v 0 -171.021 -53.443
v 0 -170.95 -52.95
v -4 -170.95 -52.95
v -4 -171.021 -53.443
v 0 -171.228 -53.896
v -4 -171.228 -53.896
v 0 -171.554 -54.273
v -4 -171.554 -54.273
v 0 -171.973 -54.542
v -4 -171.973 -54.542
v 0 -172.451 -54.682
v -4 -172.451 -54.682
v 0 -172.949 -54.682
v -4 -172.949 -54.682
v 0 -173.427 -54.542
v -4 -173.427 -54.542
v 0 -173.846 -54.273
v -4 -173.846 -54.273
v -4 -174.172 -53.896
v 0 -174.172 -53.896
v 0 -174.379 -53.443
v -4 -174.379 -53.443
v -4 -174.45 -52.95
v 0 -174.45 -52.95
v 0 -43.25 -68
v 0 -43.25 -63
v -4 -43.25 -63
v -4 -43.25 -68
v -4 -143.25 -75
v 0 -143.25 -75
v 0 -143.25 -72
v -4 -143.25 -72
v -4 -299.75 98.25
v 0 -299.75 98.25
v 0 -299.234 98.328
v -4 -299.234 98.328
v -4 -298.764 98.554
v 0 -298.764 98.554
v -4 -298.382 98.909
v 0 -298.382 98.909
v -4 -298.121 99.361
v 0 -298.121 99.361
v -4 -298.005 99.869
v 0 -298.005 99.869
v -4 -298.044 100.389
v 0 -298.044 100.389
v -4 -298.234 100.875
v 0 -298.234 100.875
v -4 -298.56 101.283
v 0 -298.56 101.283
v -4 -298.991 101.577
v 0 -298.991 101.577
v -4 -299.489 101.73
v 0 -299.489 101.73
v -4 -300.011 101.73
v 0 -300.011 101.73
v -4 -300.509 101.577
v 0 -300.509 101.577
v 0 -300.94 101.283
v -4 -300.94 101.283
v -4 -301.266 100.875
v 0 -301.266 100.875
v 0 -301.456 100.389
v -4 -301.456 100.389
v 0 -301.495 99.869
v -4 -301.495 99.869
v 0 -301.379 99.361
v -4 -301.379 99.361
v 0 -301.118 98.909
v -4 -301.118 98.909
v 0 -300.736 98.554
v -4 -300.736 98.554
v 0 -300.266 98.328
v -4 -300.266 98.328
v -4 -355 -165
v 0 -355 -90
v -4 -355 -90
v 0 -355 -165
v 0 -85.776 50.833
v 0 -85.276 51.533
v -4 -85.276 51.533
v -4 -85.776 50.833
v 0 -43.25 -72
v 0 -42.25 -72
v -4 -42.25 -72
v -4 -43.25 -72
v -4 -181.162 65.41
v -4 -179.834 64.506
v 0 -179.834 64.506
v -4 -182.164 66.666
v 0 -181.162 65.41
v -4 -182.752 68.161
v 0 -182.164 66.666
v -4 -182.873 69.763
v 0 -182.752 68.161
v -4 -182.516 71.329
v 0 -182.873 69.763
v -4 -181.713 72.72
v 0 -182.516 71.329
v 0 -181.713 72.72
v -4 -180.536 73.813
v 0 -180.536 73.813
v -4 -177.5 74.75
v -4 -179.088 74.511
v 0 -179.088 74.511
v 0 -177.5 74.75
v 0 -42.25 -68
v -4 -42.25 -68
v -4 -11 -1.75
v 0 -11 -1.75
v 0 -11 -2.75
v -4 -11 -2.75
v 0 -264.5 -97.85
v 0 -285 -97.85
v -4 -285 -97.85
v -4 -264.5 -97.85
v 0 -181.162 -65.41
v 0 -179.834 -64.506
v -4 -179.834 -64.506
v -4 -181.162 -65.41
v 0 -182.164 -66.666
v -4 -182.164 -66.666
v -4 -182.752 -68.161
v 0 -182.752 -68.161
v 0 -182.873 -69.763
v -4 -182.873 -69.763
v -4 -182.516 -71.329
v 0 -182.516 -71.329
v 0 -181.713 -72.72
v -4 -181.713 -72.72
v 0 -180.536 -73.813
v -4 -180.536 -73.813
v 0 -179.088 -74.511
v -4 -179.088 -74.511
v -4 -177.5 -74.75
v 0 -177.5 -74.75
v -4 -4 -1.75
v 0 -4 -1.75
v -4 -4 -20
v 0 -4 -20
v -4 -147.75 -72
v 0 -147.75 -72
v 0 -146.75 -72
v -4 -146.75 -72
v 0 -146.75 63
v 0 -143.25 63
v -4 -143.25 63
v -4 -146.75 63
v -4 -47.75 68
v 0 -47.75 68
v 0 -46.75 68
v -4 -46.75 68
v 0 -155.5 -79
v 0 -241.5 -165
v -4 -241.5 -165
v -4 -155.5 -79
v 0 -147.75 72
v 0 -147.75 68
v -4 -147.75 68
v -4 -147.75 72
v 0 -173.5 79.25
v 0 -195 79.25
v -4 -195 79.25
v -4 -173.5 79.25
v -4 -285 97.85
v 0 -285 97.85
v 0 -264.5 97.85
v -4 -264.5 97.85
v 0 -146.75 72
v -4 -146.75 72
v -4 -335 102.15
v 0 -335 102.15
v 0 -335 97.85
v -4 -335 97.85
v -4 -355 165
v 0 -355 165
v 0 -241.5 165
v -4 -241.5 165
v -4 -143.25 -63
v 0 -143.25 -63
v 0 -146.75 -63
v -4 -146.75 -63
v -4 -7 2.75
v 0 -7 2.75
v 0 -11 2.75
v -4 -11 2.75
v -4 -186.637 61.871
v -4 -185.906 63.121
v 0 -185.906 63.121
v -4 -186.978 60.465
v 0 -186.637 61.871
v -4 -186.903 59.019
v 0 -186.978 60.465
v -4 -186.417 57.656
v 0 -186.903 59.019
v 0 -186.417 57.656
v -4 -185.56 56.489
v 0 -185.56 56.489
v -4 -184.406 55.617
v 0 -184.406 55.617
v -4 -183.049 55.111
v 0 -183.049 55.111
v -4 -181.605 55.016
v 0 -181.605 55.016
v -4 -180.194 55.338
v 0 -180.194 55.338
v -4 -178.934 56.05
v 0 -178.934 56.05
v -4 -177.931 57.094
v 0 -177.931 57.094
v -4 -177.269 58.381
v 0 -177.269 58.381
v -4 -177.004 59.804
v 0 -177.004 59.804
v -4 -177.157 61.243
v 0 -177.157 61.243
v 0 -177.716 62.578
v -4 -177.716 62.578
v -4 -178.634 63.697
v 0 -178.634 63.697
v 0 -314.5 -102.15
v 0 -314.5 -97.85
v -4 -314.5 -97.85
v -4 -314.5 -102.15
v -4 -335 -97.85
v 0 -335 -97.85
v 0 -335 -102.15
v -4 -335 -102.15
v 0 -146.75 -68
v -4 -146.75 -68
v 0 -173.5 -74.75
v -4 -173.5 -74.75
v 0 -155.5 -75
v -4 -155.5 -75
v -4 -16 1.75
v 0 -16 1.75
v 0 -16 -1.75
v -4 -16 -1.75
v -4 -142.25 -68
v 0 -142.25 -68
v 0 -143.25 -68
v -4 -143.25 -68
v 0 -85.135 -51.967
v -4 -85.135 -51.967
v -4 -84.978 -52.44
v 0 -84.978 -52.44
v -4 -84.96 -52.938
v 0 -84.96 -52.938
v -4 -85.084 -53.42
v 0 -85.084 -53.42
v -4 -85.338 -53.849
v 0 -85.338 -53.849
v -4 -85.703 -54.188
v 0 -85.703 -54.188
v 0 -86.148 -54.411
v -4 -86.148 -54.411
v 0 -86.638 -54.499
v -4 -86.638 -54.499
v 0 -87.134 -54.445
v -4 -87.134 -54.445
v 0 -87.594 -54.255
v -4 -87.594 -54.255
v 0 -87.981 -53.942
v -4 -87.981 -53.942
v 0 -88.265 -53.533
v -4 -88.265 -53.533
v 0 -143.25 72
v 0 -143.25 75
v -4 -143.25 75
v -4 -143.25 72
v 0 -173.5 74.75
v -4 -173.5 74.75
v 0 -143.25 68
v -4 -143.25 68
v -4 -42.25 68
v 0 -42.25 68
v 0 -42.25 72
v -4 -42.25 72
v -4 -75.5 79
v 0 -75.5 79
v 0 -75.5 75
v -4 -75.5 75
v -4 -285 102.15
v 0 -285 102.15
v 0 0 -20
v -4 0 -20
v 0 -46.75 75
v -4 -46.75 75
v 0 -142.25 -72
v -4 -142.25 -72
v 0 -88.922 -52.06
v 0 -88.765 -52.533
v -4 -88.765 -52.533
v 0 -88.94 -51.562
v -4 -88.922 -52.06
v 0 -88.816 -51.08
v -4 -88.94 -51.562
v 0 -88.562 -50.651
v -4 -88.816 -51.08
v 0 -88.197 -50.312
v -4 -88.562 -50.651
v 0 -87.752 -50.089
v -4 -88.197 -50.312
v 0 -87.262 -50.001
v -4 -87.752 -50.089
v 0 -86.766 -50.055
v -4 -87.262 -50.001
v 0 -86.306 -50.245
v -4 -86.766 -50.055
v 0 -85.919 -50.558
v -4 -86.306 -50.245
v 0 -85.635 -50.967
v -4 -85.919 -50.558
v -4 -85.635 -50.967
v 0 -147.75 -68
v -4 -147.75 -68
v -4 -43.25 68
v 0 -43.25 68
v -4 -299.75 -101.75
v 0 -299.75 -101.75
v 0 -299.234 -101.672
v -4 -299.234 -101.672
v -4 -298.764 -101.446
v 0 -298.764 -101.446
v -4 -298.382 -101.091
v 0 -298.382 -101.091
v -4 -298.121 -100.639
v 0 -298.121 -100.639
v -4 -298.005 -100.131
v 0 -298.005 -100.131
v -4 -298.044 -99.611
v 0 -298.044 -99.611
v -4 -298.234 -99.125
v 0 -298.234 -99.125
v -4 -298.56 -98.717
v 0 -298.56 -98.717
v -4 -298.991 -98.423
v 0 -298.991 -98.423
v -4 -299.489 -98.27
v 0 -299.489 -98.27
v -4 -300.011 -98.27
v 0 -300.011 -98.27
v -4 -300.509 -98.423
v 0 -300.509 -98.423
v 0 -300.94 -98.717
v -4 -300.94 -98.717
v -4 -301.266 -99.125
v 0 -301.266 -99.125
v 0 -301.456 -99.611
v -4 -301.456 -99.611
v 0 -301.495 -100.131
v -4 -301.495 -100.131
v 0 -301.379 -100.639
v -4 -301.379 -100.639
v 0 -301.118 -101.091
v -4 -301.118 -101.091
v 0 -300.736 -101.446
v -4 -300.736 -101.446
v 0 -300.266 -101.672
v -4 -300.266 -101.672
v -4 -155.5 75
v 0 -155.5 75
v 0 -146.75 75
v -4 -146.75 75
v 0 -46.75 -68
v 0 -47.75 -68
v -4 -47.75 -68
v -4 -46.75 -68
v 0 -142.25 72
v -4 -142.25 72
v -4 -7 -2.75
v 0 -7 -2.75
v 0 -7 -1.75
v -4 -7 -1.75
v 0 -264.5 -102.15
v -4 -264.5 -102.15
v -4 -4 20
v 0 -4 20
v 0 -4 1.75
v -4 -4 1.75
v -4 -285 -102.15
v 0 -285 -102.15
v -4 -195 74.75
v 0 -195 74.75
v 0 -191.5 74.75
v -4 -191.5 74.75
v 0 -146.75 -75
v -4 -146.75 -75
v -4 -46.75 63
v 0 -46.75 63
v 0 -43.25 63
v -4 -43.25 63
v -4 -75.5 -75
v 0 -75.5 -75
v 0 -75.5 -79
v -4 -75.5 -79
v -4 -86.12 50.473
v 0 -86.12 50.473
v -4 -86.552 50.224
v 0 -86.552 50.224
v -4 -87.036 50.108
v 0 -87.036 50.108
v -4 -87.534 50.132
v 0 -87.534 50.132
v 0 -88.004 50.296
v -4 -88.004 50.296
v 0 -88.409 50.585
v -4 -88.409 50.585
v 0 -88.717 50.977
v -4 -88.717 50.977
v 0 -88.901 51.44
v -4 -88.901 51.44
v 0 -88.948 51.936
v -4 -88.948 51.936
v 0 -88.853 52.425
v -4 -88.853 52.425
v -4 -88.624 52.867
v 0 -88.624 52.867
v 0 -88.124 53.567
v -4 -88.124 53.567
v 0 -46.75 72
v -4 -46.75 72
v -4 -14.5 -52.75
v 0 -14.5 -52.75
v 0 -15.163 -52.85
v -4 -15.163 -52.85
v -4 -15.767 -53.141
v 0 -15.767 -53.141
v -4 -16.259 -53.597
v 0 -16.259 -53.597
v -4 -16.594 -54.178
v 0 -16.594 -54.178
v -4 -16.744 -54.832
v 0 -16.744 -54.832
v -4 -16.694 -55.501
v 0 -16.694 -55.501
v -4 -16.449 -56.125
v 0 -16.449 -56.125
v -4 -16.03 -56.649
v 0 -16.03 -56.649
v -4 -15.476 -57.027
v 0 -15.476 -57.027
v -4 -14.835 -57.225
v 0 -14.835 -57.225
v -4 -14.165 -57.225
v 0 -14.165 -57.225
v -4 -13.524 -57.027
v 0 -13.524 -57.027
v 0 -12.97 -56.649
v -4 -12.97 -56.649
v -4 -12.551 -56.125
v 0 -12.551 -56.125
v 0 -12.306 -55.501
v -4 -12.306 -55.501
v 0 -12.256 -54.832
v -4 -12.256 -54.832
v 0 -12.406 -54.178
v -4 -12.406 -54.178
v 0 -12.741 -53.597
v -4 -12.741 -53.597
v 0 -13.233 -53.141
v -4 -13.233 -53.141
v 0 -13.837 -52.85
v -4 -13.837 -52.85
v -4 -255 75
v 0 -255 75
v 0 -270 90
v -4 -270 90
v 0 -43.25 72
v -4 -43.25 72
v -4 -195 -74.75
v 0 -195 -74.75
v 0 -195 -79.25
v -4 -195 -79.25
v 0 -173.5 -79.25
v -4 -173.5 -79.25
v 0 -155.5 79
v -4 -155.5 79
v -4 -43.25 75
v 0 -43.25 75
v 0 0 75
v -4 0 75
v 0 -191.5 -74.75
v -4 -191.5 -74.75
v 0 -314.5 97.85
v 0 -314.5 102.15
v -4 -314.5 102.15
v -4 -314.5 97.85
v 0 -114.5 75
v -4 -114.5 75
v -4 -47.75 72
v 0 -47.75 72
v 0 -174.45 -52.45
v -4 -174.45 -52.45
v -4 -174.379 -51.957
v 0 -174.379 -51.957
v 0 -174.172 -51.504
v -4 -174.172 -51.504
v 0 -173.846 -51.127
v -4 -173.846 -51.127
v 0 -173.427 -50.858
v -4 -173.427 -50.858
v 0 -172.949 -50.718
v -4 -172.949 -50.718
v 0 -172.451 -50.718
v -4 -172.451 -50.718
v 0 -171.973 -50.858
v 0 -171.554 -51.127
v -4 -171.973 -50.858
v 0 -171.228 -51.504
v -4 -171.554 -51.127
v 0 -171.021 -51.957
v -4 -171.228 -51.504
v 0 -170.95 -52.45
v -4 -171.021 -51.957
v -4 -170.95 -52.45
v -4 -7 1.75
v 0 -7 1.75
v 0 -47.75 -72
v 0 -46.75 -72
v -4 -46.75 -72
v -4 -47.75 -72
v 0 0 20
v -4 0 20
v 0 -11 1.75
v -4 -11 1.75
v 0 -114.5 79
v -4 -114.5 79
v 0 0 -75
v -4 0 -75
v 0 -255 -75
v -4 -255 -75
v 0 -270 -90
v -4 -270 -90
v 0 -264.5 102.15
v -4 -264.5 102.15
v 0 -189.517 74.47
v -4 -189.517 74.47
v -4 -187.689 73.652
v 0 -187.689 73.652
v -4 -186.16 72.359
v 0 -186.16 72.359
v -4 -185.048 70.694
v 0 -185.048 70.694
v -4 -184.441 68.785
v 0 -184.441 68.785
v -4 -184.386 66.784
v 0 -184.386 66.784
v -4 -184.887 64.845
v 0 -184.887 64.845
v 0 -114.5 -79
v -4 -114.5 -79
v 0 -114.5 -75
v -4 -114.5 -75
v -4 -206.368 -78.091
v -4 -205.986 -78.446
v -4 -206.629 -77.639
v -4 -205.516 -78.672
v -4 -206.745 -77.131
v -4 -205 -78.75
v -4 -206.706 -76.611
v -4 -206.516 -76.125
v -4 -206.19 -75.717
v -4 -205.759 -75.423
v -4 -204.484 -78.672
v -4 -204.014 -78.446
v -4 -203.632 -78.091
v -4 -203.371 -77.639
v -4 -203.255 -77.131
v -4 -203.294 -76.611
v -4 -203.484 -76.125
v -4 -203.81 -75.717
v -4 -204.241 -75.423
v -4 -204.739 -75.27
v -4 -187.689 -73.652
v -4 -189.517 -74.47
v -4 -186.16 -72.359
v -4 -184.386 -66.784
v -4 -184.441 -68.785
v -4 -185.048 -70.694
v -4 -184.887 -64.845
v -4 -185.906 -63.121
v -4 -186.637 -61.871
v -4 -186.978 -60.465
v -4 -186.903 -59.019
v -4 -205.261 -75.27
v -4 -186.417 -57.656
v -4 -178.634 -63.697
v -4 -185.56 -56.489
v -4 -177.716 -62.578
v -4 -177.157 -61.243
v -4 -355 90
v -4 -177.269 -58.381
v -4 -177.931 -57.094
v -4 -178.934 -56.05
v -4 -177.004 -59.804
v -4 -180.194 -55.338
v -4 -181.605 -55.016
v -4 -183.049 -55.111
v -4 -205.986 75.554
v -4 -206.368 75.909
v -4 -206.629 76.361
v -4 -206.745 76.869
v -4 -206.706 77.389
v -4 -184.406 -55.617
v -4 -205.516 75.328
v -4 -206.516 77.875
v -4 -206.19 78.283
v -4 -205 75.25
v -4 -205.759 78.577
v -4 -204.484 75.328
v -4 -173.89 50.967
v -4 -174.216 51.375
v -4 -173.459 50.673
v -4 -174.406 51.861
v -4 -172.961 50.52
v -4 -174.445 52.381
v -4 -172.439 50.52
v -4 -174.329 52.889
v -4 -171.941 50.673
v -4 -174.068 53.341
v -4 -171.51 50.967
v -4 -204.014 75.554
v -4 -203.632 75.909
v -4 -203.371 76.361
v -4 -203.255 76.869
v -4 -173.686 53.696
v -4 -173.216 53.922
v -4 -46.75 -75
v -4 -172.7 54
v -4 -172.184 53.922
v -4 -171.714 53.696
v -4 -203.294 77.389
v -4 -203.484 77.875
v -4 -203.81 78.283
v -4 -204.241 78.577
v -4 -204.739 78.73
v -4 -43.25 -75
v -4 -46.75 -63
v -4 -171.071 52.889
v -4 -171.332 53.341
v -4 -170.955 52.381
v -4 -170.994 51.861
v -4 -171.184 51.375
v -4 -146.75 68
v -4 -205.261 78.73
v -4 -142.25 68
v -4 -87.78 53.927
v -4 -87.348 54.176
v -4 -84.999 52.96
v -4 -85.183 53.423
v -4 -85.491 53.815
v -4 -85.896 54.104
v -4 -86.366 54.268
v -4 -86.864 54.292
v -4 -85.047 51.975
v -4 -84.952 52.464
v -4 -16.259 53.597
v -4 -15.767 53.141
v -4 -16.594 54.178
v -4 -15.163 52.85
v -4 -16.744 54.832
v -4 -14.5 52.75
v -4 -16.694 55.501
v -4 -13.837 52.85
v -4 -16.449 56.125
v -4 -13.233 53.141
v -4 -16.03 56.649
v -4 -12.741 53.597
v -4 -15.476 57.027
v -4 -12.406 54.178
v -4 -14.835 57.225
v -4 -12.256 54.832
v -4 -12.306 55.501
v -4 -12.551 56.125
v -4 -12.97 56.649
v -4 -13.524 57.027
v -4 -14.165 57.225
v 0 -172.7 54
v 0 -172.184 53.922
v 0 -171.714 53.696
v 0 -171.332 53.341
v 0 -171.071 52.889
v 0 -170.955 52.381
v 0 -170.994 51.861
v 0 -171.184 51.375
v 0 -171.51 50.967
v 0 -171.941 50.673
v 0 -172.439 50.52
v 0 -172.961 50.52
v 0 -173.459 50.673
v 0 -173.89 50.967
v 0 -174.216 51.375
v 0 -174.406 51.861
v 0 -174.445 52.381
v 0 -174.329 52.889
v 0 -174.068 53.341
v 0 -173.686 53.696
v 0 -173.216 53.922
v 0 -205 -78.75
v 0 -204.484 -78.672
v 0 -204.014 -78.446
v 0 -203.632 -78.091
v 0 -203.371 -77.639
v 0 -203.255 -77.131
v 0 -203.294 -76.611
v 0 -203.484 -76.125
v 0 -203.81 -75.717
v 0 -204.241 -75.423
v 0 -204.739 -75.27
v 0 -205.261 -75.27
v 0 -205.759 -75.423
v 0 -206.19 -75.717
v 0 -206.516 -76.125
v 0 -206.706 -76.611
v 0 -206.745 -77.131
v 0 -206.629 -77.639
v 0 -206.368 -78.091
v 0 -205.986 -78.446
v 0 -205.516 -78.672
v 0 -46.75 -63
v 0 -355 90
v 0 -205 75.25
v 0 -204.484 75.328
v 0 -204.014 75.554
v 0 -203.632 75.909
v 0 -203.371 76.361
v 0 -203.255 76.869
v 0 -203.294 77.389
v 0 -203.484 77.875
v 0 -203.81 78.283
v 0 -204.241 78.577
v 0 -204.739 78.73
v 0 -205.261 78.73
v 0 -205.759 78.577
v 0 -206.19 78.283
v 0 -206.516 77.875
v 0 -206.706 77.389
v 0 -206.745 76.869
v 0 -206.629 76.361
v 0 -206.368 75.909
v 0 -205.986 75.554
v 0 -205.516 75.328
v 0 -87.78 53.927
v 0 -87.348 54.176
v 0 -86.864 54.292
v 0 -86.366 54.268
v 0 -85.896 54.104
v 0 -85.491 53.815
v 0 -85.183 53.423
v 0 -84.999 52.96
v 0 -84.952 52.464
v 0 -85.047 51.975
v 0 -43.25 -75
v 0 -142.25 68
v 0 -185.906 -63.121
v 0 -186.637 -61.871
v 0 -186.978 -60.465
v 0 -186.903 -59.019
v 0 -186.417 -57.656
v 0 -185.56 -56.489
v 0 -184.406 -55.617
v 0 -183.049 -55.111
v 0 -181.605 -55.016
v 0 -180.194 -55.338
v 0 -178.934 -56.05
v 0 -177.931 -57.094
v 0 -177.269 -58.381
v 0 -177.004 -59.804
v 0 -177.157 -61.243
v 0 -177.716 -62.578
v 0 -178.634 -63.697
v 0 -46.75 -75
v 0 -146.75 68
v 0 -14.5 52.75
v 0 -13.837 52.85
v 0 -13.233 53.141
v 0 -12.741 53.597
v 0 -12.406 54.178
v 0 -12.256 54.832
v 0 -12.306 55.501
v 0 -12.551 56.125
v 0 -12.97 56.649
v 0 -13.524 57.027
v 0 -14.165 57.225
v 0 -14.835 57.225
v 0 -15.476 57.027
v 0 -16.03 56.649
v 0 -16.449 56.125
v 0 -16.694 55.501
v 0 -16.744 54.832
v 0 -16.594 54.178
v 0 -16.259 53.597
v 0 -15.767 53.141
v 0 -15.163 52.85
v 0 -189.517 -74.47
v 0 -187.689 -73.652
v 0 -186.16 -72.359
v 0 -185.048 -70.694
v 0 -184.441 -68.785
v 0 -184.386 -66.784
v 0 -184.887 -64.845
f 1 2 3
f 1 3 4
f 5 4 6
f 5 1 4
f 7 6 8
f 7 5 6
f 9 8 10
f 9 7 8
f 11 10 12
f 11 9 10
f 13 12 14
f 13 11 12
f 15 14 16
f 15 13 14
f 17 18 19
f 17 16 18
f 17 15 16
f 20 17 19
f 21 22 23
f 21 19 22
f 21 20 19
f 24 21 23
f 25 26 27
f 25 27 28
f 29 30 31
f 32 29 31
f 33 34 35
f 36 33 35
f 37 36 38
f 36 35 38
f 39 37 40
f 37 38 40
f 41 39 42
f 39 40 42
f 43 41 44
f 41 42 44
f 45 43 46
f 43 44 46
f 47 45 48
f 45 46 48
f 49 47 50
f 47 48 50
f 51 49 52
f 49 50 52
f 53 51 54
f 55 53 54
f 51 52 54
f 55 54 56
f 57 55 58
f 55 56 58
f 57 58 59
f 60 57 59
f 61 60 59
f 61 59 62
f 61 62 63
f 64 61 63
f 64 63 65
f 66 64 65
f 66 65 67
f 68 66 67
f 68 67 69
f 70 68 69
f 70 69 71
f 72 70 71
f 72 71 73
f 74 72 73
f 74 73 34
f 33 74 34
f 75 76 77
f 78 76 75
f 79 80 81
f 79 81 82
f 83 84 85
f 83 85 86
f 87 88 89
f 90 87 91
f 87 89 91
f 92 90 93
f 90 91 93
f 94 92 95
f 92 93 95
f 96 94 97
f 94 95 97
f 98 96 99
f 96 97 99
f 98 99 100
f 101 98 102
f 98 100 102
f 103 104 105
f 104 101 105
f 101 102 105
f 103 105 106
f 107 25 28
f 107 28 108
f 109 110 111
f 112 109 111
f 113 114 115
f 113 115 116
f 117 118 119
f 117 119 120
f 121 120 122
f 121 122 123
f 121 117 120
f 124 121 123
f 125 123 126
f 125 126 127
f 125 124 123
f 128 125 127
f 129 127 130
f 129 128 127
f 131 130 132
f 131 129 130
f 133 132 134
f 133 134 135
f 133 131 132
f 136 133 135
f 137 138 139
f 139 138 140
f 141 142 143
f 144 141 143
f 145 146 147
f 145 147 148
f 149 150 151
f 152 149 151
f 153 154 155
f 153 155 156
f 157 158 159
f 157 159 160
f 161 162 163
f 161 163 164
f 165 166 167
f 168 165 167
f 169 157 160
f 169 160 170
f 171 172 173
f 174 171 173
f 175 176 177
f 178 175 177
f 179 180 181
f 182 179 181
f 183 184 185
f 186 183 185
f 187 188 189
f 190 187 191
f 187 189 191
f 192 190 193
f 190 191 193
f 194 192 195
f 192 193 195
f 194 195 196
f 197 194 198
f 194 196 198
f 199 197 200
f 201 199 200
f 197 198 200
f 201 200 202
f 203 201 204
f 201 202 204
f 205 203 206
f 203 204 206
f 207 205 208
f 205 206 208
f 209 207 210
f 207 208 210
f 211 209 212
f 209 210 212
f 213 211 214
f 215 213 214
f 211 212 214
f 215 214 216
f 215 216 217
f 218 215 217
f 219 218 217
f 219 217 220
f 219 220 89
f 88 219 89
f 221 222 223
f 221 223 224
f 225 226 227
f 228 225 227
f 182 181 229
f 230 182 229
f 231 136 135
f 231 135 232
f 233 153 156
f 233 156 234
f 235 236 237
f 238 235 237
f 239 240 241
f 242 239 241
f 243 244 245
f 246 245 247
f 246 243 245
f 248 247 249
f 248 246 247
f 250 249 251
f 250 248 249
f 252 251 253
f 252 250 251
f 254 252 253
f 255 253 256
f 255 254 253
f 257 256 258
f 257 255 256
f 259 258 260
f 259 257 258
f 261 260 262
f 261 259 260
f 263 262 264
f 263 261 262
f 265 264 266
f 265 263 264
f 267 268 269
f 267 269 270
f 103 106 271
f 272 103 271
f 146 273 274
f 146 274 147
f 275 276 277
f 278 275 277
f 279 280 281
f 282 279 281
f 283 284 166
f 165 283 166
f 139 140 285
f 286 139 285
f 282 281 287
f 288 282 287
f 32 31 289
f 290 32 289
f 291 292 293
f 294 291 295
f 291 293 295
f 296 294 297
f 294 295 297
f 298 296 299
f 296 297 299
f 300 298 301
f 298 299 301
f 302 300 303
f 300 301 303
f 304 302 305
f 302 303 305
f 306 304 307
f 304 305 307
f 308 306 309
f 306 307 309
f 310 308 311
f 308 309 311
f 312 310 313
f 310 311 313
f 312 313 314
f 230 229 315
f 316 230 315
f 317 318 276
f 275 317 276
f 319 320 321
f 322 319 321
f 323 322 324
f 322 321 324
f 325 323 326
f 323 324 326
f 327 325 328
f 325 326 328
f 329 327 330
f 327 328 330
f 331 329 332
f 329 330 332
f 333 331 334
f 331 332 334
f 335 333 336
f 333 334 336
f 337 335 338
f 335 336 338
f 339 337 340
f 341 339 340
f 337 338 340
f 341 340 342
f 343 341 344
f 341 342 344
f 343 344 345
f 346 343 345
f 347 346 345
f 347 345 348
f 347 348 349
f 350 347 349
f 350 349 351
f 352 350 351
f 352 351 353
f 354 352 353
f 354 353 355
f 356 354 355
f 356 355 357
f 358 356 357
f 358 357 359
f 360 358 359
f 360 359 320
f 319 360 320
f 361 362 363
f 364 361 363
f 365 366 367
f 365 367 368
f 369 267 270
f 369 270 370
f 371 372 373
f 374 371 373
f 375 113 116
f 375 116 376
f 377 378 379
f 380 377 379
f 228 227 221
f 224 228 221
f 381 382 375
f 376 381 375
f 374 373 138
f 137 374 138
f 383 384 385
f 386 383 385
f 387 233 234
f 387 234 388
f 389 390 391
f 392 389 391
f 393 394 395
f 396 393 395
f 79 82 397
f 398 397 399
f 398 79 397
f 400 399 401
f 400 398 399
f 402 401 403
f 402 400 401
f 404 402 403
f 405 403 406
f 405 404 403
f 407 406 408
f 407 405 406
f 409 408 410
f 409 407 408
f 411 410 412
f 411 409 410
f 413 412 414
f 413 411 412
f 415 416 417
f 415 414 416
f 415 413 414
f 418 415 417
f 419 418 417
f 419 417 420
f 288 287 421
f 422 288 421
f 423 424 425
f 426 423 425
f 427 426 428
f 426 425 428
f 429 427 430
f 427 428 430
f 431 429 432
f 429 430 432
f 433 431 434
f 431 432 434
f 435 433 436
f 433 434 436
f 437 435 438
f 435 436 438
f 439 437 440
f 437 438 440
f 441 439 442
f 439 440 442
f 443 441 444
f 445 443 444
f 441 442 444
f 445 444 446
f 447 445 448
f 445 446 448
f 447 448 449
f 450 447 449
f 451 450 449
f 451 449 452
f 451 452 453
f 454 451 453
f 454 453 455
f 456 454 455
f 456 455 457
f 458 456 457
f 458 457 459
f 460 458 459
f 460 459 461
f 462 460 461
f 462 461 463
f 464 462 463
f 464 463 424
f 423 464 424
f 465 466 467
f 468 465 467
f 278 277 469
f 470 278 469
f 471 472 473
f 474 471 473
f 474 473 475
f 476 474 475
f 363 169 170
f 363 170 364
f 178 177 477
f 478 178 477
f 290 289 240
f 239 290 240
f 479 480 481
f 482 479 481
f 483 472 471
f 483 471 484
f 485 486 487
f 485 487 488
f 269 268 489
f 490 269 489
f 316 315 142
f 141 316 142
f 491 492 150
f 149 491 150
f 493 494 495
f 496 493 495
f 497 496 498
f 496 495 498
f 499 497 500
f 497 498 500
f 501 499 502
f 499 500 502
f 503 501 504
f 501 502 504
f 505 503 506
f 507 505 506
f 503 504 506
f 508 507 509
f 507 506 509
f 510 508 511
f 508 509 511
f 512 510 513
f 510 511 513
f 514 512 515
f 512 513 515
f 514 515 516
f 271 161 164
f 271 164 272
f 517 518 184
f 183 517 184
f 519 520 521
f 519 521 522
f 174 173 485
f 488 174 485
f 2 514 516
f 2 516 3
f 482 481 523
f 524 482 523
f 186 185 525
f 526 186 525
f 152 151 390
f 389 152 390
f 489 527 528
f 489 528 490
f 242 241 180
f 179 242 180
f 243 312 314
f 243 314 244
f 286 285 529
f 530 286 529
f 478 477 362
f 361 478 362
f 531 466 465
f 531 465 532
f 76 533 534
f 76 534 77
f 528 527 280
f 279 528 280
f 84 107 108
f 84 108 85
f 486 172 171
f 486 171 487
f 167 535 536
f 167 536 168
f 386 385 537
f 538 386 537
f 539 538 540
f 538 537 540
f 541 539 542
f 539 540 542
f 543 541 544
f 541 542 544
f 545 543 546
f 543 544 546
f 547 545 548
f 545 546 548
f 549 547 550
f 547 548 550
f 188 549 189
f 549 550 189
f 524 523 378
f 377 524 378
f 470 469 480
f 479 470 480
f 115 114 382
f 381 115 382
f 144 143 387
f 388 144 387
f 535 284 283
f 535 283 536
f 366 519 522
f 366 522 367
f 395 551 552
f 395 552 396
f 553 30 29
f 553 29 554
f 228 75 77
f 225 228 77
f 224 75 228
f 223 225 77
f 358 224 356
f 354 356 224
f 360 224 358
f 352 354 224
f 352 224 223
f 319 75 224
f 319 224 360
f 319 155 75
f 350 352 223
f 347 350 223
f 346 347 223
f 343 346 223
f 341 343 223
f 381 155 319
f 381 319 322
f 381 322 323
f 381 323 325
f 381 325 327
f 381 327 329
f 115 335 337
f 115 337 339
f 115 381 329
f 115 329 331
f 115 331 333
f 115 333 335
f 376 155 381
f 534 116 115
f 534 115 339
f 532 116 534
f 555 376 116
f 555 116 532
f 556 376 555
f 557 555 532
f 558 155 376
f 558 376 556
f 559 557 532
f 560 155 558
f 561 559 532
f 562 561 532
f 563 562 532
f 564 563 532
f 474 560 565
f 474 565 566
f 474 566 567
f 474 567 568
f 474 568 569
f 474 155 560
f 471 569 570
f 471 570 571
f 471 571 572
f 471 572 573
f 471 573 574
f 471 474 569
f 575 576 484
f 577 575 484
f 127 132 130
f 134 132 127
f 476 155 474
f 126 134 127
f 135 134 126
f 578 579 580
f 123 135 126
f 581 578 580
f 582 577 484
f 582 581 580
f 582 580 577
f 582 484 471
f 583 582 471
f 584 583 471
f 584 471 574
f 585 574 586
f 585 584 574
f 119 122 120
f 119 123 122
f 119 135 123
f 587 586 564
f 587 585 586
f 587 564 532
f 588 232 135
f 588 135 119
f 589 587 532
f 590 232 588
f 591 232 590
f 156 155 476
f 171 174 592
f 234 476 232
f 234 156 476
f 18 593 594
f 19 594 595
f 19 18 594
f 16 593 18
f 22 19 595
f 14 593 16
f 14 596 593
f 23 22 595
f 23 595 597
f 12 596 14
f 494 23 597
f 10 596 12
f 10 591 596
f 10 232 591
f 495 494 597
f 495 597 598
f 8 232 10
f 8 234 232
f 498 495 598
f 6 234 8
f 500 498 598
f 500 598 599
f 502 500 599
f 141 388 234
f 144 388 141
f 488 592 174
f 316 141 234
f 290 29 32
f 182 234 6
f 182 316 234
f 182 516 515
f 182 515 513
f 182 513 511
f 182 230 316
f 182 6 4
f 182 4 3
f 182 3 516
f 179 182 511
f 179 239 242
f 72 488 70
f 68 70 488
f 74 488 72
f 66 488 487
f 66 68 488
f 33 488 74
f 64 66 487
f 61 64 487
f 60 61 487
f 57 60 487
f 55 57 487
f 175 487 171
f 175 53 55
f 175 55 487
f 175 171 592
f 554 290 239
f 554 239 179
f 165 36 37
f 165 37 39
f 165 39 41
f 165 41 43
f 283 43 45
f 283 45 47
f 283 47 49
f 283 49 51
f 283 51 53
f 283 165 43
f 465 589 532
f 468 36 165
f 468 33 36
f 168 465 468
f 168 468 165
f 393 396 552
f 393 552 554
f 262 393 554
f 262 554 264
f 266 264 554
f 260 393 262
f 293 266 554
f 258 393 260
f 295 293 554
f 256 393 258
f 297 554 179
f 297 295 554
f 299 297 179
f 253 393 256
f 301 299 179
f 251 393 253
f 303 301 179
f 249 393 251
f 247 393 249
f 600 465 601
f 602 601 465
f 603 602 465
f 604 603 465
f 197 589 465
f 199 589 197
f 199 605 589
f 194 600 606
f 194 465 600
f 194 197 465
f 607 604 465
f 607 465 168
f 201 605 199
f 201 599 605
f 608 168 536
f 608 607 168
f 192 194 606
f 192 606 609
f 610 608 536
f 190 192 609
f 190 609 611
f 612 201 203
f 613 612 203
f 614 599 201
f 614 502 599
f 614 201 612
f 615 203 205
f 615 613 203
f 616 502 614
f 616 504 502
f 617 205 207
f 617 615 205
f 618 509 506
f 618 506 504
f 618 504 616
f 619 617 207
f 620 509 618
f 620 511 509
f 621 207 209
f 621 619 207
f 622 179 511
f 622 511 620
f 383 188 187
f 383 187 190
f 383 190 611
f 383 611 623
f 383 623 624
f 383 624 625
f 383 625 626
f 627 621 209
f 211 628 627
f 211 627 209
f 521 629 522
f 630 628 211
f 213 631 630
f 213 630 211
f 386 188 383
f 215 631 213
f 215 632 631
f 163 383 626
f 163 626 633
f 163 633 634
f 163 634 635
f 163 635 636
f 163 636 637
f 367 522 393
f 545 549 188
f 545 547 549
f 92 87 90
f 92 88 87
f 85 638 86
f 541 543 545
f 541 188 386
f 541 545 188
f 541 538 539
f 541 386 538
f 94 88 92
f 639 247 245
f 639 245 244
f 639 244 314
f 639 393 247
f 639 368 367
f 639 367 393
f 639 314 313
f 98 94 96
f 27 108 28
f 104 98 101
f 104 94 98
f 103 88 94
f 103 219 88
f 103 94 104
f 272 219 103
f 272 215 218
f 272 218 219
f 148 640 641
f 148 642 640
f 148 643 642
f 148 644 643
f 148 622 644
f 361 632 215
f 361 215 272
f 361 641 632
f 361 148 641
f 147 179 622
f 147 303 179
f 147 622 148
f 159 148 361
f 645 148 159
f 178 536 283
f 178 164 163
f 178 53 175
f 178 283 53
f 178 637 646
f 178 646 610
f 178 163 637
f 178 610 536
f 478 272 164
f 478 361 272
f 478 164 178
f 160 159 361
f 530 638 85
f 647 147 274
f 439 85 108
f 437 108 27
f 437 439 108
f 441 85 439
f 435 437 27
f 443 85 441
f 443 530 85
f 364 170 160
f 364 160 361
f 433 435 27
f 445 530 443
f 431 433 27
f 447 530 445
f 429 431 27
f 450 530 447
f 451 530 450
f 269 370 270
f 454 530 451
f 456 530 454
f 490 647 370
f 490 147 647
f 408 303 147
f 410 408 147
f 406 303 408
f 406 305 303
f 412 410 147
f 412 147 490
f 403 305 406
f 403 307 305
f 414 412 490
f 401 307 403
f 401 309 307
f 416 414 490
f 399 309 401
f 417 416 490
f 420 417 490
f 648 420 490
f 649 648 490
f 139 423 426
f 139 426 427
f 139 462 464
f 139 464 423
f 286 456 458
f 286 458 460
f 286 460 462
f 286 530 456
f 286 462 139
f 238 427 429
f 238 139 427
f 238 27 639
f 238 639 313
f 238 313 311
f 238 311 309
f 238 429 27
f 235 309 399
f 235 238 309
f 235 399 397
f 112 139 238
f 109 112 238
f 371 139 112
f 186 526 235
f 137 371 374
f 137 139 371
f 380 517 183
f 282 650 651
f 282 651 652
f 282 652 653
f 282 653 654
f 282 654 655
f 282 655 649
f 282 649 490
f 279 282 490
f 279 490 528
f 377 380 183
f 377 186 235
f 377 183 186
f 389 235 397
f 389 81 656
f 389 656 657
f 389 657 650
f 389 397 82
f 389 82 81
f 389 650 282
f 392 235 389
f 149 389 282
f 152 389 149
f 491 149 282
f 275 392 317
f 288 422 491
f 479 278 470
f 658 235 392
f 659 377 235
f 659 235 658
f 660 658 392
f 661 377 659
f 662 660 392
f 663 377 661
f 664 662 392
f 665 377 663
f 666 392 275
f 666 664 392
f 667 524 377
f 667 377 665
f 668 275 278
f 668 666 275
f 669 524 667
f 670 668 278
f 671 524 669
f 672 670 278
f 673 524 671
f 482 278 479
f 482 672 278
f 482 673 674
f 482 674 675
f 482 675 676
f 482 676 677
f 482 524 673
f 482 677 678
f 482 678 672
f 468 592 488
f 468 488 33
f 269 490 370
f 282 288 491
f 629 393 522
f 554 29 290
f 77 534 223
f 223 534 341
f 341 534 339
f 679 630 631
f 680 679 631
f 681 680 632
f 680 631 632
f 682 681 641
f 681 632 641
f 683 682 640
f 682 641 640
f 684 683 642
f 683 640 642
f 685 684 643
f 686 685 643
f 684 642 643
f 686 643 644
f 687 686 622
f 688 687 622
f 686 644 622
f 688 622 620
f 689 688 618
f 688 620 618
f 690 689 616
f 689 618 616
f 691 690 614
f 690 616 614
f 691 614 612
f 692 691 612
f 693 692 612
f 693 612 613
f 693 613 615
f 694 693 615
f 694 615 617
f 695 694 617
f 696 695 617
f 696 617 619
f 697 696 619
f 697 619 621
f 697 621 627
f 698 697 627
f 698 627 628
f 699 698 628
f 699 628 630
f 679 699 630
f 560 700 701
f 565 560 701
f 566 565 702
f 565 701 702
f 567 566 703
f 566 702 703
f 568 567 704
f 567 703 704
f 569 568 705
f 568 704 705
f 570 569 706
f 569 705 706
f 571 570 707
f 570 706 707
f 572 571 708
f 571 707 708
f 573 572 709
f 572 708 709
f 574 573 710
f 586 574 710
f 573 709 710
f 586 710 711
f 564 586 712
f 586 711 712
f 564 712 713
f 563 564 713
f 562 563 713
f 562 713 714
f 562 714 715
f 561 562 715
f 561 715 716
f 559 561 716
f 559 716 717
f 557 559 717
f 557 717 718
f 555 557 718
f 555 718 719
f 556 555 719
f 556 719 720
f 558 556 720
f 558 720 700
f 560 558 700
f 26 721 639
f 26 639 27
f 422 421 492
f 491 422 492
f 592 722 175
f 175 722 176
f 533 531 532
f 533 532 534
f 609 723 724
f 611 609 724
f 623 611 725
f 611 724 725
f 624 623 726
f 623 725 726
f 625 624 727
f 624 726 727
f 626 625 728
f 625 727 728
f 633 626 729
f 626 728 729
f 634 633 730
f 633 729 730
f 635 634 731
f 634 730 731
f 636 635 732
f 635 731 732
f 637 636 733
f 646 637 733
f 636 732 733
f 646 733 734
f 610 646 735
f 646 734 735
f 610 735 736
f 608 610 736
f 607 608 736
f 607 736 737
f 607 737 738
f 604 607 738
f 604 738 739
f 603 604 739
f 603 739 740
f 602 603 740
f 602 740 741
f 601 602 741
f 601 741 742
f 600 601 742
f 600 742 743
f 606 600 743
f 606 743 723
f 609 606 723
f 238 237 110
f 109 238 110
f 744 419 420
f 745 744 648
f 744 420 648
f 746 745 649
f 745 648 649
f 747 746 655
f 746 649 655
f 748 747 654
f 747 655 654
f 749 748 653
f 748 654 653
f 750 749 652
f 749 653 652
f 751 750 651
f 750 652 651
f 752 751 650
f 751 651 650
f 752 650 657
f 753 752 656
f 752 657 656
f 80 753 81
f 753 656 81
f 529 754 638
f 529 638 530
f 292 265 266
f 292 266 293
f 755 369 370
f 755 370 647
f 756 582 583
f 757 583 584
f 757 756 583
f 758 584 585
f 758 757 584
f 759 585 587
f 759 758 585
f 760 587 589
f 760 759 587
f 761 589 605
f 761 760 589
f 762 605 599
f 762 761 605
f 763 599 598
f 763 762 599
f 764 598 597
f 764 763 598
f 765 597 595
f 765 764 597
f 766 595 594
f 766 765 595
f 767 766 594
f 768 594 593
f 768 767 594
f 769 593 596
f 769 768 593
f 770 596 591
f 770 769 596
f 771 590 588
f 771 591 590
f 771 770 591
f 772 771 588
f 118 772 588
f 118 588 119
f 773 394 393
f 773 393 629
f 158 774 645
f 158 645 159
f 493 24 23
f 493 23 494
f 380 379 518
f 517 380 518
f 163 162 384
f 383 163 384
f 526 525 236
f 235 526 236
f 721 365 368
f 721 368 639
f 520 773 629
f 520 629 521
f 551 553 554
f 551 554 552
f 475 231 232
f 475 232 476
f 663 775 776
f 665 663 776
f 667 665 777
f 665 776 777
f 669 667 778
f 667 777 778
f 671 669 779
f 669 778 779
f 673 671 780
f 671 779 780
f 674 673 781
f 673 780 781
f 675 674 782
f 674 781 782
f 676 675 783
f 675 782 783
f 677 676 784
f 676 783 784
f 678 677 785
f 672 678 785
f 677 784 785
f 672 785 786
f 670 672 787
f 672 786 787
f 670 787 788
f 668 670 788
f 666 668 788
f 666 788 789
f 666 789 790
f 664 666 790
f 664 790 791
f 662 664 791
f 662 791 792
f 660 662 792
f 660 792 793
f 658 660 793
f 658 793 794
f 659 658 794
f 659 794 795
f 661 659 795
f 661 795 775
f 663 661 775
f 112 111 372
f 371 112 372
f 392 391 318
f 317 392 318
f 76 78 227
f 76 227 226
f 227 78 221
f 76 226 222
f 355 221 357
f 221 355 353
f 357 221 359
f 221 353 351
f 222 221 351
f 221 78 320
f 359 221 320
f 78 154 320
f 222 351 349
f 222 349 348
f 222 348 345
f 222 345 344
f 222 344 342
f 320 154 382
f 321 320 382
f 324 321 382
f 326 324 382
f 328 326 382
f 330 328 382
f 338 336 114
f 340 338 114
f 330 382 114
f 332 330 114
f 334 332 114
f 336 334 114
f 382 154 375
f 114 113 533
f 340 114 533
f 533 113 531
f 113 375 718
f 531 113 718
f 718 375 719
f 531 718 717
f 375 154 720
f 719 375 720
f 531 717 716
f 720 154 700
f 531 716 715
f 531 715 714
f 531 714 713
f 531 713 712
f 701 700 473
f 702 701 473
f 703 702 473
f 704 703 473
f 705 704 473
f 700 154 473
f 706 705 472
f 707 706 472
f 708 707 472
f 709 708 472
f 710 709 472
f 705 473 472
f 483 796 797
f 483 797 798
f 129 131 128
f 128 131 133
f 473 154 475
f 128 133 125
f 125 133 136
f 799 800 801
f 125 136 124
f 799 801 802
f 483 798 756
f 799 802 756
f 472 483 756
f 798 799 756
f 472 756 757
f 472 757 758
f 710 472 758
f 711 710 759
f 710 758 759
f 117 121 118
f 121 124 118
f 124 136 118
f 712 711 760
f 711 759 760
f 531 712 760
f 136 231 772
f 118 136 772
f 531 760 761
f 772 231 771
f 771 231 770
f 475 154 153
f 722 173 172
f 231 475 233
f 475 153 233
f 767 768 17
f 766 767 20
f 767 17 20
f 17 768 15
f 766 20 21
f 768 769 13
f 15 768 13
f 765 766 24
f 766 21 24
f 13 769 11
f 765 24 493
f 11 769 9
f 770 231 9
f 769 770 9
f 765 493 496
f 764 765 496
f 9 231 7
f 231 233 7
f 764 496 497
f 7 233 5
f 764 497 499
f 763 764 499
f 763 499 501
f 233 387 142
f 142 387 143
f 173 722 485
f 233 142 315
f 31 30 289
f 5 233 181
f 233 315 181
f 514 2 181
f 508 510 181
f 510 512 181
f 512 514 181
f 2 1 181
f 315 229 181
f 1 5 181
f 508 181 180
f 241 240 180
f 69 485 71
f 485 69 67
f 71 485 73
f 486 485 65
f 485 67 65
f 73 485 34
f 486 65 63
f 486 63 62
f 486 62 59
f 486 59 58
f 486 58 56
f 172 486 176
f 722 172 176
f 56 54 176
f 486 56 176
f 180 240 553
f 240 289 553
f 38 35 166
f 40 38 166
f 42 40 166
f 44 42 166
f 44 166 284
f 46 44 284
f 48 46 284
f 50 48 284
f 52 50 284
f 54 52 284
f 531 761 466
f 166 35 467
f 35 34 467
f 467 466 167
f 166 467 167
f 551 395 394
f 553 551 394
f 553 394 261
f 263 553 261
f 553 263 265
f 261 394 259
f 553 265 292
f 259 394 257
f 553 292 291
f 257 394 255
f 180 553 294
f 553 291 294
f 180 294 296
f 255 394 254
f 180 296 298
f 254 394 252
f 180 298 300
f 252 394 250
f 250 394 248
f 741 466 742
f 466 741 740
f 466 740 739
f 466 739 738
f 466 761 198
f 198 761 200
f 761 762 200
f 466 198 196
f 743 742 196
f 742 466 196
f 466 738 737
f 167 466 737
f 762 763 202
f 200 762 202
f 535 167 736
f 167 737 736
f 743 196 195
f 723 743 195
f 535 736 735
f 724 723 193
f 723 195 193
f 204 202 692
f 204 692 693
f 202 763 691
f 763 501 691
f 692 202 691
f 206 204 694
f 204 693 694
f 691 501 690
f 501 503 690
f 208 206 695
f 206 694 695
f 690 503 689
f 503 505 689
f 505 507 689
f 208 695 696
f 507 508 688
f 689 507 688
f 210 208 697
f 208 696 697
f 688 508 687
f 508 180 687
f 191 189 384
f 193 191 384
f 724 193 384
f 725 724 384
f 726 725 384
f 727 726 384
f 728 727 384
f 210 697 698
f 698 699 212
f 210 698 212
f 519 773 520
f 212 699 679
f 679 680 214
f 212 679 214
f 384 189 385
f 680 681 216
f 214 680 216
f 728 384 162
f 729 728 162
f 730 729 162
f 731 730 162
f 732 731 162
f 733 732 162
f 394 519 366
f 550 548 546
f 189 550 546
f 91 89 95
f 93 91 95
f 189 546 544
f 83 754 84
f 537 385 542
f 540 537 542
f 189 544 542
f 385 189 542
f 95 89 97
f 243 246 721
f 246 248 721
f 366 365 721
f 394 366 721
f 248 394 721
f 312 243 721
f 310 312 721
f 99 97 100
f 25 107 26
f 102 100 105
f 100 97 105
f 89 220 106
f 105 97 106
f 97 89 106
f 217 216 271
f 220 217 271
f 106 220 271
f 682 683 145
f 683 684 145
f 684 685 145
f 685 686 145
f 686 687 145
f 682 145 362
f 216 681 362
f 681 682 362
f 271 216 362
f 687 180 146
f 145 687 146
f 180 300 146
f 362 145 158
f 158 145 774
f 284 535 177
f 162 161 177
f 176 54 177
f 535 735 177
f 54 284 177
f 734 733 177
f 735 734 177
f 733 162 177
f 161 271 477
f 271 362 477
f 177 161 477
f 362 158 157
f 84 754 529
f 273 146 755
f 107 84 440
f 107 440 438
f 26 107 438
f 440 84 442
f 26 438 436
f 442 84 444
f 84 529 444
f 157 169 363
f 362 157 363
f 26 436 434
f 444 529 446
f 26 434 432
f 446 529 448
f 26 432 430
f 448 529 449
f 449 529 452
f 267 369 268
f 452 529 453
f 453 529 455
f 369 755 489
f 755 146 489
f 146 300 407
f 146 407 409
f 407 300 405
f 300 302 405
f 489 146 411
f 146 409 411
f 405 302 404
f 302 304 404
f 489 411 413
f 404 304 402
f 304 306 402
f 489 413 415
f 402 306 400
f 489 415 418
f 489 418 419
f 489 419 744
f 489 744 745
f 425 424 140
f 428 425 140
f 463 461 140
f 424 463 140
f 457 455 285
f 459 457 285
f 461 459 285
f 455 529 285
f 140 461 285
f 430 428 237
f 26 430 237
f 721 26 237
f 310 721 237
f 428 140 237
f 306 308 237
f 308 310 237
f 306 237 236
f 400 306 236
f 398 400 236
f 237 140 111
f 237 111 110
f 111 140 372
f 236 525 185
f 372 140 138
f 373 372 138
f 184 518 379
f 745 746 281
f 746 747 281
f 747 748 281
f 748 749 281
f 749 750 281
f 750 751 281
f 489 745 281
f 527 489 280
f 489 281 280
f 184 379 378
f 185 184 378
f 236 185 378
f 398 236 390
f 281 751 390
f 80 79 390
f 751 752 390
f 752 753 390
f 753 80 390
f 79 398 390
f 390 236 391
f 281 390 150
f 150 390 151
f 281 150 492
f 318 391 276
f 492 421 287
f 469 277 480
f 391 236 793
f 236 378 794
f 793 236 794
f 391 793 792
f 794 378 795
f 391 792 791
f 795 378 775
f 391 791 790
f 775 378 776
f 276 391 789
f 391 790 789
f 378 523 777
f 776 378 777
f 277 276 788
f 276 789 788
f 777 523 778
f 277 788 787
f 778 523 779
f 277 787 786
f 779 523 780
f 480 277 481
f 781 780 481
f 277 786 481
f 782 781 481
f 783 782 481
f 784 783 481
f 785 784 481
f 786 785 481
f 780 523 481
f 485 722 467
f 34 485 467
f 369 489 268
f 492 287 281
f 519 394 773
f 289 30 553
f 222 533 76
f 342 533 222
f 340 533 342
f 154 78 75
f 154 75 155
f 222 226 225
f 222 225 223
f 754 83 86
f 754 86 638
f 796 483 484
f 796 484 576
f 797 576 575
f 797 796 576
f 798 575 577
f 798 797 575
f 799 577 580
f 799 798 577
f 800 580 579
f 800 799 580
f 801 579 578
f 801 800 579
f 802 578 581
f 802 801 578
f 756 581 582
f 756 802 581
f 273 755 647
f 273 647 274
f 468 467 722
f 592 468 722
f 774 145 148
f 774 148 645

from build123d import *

# Parameters (mm, degrees)
SKETCH1_W           = 150
SKETCH1_H           = 255
BASE_FLANGE1_DEPTH  = 4
CUT_EXTRUDE1_DEPTH  = 266.830773237
SKETCH5_W           = 4
SKETCH5_H           = 39
TAB1_DEPTH          = 4
SKETCH6_R           = 2.25
CUT_EXTRUDE2_DEPTH  = 267.986891064
TAB2_DEPTH          = 4
SKETCH8_R           = 1.75
CUT_EXTRUDE3_DEPTH  = 392.492017799
SKETCH10_R          = 1.75
SKETCH10_W          = 4.3
SKETCH10_H          = 20.5
CUT_EXTRUDE5_DEPTH  = 392.492017799
CUT_EXTRUDE6_DEPTH  = 392.492017799
SKETCH12_W          = 4.5
SKETCH12_H          = 21.5
CUT_EXTRUDE7_DEPTH  = 392.492017799
SKETCH14_R          = 1.75
CUT_EXTRUDE9_DEPTH  = 392.492017799
CUT_EXTRUDE11_DEPTH = 392.492017799
CUT_EXTRUDE12_DEPTH = 392.492017799


# Sheet-metal steps are written as plain solids
with BuildPart() as part:
    # Sketch1 → Base-Flange1 (new body)
    with BuildSketch(Plane(origin=(0, 0, 0), x_dir=(0, 0, -1), z_dir=(1, 0, 0))):
        with Locations((0, -127.5)):
            Rectangle(SKETCH1_W, SKETCH1_H)
    extrude(amount=-BASE_FLANGE1_DEPTH)

    # Sketch4 → Cut-Extrude1 (cut, through all)
    with BuildSketch(Plane(origin=(0, 0, 0), x_dir=(0, 0, -1), z_dir=(1, 0, 0))):
        Polygon((-75, -43.25), (-75, -46.75), (-72, -46.75), (-72, -47.75), (-68, -47.75), (-68, -46.75), (-63, -46.75), (-63, -43.25), (-68, -43.25), (-68, -42.25), (-72, -42.25), (-72, -43.25), align=None)
        Polygon((-72, -146.75), (-75, -146.75), (-75, -143.25), (-72, -143.25), (-72, -142.25), (-68, -142.25), (-68, -143.25), (-63, -143.25), (-63, -146.75), (-68, -146.75), (-68, -147.75), (-72, -147.75), align=None)
        Polygon((75, -146.75), (75, -143.25), (72, -143.25), (72, -142.25), (68, -142.25), (68, -143.25), (63, -143.25), (63, -146.75), (68, -146.75), (68, -147.75), (72, -147.75), (72, -146.75), align=None)
        Polygon((72, -43.25), (75, -43.25), (75, -46.75), (72, -46.75), (72, -47.75), (68, -47.75), (68, -46.75), (63, -46.75), (63, -43.25), (68, -43.25), (68, -42.25), (72, -42.25), align=None)
    extrude(amount=-CUT_EXTRUDE1_DEPTH, mode=Mode.SUBTRACT)

    # Sketch5 → Tab1 (add)
    with BuildSketch(Plane(origin=(0, 0, 0), x_dir=(0, 0, -1), z_dir=(1, 0, 0))):
        with Locations((-77, -95)):
            Rectangle(SKETCH5_W, SKETCH5_H)
        with Locations((77, -95)):
            Rectangle(SKETCH5_W, SKETCH5_H)
    extrude(amount=-TAB1_DEPTH)

    # Sketch6 → Cut-Extrude2 (cut, through all)
    with BuildSketch(Plane(origin=(0, 0, 0), x_dir=(0, 0, -1), z_dir=(1, 0, 0))):
        with Locations((-55, -14.5)):
            Circle(SKETCH6_R)
        with Locations(Location((55, -14.5, 0), (0, 0, 180))):
            Circle(SKETCH6_R)
    extrude(amount=-CUT_EXTRUDE2_DEPTH, mode=Mode.SUBTRACT)

    # Sketch7 → Tab2 (add)
    with BuildSketch(Plane(origin=(0, 0, 0), x_dir=(0, 0, -1), z_dir=(1, 0, 0))):
        Polygon((-75, -255), (-90, -270), (-90, -355), (-165, -355), (-165, -241.5), (-79, -155.5), (-75, -155.5), align=None)
        Polygon((75, -155.5), (75, -255), (90, -270), (90, -355), (165, -355), (165, -241.5), (79, -155.5), align=None)
    extrude(amount=-TAB2_DEPTH)

    # Sketch8 → Cut-Extrude3 (cut, through all)
    with BuildSketch(Plane(origin=(0, 0, 0), x_dir=(0, 0, -1), z_dir=(1, 0, 0))):
        with Locations((-77, -205)):
            Circle(SKETCH8_R)
        with Locations((77, -205)):
            Circle(SKETCH8_R)
    extrude(amount=-CUT_EXTRUDE3_DEPTH, mode=Mode.SUBTRACT)

    # Sketch10 → Cut-Extrude5 (cut, through all)
    with BuildSketch(Plane(origin=(0, 0, 0), x_dir=(0, 0, -1), z_dir=(1, 0, 0))):
        with Locations((-100, -299.75)):
            Circle(SKETCH10_R)
        with Locations((100, -299.75)):
            Circle(SKETCH10_R)
        with Locations((-100, -324.75)):
            Rectangle(SKETCH10_W, SKETCH10_H)
        with Locations((-100, -274.75)):
            Rectangle(SKETCH10_W, SKETCH10_H)
        with Locations((100, -274.75)):
            Rectangle(SKETCH10_W, SKETCH10_H)
        with Locations((100, -324.75)):
            Rectangle(SKETCH10_W, SKETCH10_H)
    extrude(amount=-CUT_EXTRUDE5_DEPTH, mode=Mode.SUBTRACT)

    # Sketch11 → Cut-Extrude6 (cut, through all)
    with BuildSketch(Plane(origin=(0, 0, 0), x_dir=(0, 0, -1), z_dir=(1, 0, 0))):
        Polygon((-20, 0), (-20, -4), (-1.75, -4), (-1.75, -7), (-2.75, -7), (-2.75, -11), (-1.75, -11), (-1.75, -16), (1.75, -16), (1.75, -11), (2.75, -11), (2.75, -7), (1.75, -7), (1.75, -4), (20, -4), (20, 0), align=None)
    extrude(amount=-CUT_EXTRUDE6_DEPTH, mode=Mode.SUBTRACT)

    # Sketch12 → Cut-Extrude7 (cut, through all)
    with BuildSketch(Plane(origin=(0, 0, 0), x_dir=(0, 0, -1), z_dir=(1, 0, 0))):
        with Locations((-77, -184.25)):
            Rectangle(SKETCH12_W, SKETCH12_H)
        with Locations((77, -184.25)):
            Rectangle(SKETCH12_W, SKETCH12_H)
    extrude(amount=-CUT_EXTRUDE7_DEPTH, mode=Mode.SUBTRACT)

    # Sketch14 → Cut-Extrude9 (cut, through all)
    with BuildSketch(Plane(origin=(-4, 0, 0), x_dir=(0, 1, 0), z_dir=(-1, 0, 0))):
        with Locations(Location((-172.7, 52.45, 0), (0, 0, 270))):
            Circle(SKETCH14_R)
        with Locations(Location((-172.7, -52.25, 0), (0, 0, 270))):
            Circle(SKETCH14_R)
        with Locations(Location((-86.7, -52.55, 0), (0, 0, 270))):
            Circle(SKETCH14_R)
        with Locations(Location((-87.2, 51.75, 0), (0, 0, 270))):
            Circle(SKETCH14_R)
    extrude(amount=-CUT_EXTRUDE9_DEPTH, mode=Mode.SUBTRACT)

    # Sketch16 → Cut-Extrude11 (cut, through all)
    with BuildSketch(Plane(origin=(0, 0, 0), x_dir=(0, 0, -1), z_dir=(1, 0, 0))):
        with BuildLine():
            Line((-74.75, -177.5), (-74.75, -191.5))
            ThreePointArc((-74.75, -191.5), (-70.693771456, -185.047817237), (-63.121014964, -185.906310995))
            ThreePointArc((-63.121014964, -185.906310995), (-55.125270956, -180.887787453), (-64.506473724, -179.833968012))
            ThreePointArc((-64.506473724, -179.833968012), (-70.559234361, -182.753028585), (-74.75, -177.5))
        make_face()
        with BuildLine():
            Line((74.75, -177.5), (74.75, -191.5))
            ThreePointArc((74.75, -191.5), (70.693771456, -185.047817237), (63.121014964, -185.906310995))
            ThreePointArc((63.121014964, -185.906310995), (55.125270956, -180.887787453), (64.506473724, -179.833968012))
            ThreePointArc((64.506473724, -179.833968012), (70.559234361, -182.753028585), (74.75, -177.5))
        make_face()
    extrude(amount=-CUT_EXTRUDE11_DEPTH, mode=Mode.SUBTRACT)

    # Sketch17 → Cut-Extrude12 (cut, through all)
    with BuildSketch(Plane(origin=(0, 0, 0), x_dir=(0, 0, -1), z_dir=(1, 0, 0))):
        with BuildLine():
            Line((52.45, -170.95), (52.95, -170.95))
            ThreePointArc((52.95, -170.95), (54.7, -172.7), (52.95, -174.45))
            Line((52.95, -174.45), (52.45, -174.45))
            ThreePointArc((52.45, -174.45), (50.7, -172.7), (52.45, -170.95))
        make_face()
        with BuildLine():
            Line((-51.532833161, -85.275966425), (-50.832833161, -85.775966425))
            ThreePointArc((-50.832833161, -85.775966425), (-50.425966425, -88.217166839), (-52.867166839, -88.624033575))
            Line((-52.867166839, -88.624033575), (-53.567166839, -88.124033575))
            ThreePointArc((-53.567166839, -88.124033575), (-53.974033575, -85.682833161), (-51.532833161, -85.275966425))
        make_face()
        with BuildLine():
            Line((50.967376208, -85.634752416), (51.967376208, -85.134752416))
            ThreePointArc((51.967376208, -85.134752416), (54.315247584, -85.917376208), (53.532623792, -88.265247584))
            Line((53.532623792, -88.265247584), (52.532623792, -88.765247584))
            ThreePointArc((52.532623792, -88.765247584), (50.184752416, -87.982623792), (50.967376208, -85.634752416))
        make_face()
    extrude(amount=-CUT_EXTRUDE12_DEPTH, mode=Mode.SUBTRACT)


solid = part.part
